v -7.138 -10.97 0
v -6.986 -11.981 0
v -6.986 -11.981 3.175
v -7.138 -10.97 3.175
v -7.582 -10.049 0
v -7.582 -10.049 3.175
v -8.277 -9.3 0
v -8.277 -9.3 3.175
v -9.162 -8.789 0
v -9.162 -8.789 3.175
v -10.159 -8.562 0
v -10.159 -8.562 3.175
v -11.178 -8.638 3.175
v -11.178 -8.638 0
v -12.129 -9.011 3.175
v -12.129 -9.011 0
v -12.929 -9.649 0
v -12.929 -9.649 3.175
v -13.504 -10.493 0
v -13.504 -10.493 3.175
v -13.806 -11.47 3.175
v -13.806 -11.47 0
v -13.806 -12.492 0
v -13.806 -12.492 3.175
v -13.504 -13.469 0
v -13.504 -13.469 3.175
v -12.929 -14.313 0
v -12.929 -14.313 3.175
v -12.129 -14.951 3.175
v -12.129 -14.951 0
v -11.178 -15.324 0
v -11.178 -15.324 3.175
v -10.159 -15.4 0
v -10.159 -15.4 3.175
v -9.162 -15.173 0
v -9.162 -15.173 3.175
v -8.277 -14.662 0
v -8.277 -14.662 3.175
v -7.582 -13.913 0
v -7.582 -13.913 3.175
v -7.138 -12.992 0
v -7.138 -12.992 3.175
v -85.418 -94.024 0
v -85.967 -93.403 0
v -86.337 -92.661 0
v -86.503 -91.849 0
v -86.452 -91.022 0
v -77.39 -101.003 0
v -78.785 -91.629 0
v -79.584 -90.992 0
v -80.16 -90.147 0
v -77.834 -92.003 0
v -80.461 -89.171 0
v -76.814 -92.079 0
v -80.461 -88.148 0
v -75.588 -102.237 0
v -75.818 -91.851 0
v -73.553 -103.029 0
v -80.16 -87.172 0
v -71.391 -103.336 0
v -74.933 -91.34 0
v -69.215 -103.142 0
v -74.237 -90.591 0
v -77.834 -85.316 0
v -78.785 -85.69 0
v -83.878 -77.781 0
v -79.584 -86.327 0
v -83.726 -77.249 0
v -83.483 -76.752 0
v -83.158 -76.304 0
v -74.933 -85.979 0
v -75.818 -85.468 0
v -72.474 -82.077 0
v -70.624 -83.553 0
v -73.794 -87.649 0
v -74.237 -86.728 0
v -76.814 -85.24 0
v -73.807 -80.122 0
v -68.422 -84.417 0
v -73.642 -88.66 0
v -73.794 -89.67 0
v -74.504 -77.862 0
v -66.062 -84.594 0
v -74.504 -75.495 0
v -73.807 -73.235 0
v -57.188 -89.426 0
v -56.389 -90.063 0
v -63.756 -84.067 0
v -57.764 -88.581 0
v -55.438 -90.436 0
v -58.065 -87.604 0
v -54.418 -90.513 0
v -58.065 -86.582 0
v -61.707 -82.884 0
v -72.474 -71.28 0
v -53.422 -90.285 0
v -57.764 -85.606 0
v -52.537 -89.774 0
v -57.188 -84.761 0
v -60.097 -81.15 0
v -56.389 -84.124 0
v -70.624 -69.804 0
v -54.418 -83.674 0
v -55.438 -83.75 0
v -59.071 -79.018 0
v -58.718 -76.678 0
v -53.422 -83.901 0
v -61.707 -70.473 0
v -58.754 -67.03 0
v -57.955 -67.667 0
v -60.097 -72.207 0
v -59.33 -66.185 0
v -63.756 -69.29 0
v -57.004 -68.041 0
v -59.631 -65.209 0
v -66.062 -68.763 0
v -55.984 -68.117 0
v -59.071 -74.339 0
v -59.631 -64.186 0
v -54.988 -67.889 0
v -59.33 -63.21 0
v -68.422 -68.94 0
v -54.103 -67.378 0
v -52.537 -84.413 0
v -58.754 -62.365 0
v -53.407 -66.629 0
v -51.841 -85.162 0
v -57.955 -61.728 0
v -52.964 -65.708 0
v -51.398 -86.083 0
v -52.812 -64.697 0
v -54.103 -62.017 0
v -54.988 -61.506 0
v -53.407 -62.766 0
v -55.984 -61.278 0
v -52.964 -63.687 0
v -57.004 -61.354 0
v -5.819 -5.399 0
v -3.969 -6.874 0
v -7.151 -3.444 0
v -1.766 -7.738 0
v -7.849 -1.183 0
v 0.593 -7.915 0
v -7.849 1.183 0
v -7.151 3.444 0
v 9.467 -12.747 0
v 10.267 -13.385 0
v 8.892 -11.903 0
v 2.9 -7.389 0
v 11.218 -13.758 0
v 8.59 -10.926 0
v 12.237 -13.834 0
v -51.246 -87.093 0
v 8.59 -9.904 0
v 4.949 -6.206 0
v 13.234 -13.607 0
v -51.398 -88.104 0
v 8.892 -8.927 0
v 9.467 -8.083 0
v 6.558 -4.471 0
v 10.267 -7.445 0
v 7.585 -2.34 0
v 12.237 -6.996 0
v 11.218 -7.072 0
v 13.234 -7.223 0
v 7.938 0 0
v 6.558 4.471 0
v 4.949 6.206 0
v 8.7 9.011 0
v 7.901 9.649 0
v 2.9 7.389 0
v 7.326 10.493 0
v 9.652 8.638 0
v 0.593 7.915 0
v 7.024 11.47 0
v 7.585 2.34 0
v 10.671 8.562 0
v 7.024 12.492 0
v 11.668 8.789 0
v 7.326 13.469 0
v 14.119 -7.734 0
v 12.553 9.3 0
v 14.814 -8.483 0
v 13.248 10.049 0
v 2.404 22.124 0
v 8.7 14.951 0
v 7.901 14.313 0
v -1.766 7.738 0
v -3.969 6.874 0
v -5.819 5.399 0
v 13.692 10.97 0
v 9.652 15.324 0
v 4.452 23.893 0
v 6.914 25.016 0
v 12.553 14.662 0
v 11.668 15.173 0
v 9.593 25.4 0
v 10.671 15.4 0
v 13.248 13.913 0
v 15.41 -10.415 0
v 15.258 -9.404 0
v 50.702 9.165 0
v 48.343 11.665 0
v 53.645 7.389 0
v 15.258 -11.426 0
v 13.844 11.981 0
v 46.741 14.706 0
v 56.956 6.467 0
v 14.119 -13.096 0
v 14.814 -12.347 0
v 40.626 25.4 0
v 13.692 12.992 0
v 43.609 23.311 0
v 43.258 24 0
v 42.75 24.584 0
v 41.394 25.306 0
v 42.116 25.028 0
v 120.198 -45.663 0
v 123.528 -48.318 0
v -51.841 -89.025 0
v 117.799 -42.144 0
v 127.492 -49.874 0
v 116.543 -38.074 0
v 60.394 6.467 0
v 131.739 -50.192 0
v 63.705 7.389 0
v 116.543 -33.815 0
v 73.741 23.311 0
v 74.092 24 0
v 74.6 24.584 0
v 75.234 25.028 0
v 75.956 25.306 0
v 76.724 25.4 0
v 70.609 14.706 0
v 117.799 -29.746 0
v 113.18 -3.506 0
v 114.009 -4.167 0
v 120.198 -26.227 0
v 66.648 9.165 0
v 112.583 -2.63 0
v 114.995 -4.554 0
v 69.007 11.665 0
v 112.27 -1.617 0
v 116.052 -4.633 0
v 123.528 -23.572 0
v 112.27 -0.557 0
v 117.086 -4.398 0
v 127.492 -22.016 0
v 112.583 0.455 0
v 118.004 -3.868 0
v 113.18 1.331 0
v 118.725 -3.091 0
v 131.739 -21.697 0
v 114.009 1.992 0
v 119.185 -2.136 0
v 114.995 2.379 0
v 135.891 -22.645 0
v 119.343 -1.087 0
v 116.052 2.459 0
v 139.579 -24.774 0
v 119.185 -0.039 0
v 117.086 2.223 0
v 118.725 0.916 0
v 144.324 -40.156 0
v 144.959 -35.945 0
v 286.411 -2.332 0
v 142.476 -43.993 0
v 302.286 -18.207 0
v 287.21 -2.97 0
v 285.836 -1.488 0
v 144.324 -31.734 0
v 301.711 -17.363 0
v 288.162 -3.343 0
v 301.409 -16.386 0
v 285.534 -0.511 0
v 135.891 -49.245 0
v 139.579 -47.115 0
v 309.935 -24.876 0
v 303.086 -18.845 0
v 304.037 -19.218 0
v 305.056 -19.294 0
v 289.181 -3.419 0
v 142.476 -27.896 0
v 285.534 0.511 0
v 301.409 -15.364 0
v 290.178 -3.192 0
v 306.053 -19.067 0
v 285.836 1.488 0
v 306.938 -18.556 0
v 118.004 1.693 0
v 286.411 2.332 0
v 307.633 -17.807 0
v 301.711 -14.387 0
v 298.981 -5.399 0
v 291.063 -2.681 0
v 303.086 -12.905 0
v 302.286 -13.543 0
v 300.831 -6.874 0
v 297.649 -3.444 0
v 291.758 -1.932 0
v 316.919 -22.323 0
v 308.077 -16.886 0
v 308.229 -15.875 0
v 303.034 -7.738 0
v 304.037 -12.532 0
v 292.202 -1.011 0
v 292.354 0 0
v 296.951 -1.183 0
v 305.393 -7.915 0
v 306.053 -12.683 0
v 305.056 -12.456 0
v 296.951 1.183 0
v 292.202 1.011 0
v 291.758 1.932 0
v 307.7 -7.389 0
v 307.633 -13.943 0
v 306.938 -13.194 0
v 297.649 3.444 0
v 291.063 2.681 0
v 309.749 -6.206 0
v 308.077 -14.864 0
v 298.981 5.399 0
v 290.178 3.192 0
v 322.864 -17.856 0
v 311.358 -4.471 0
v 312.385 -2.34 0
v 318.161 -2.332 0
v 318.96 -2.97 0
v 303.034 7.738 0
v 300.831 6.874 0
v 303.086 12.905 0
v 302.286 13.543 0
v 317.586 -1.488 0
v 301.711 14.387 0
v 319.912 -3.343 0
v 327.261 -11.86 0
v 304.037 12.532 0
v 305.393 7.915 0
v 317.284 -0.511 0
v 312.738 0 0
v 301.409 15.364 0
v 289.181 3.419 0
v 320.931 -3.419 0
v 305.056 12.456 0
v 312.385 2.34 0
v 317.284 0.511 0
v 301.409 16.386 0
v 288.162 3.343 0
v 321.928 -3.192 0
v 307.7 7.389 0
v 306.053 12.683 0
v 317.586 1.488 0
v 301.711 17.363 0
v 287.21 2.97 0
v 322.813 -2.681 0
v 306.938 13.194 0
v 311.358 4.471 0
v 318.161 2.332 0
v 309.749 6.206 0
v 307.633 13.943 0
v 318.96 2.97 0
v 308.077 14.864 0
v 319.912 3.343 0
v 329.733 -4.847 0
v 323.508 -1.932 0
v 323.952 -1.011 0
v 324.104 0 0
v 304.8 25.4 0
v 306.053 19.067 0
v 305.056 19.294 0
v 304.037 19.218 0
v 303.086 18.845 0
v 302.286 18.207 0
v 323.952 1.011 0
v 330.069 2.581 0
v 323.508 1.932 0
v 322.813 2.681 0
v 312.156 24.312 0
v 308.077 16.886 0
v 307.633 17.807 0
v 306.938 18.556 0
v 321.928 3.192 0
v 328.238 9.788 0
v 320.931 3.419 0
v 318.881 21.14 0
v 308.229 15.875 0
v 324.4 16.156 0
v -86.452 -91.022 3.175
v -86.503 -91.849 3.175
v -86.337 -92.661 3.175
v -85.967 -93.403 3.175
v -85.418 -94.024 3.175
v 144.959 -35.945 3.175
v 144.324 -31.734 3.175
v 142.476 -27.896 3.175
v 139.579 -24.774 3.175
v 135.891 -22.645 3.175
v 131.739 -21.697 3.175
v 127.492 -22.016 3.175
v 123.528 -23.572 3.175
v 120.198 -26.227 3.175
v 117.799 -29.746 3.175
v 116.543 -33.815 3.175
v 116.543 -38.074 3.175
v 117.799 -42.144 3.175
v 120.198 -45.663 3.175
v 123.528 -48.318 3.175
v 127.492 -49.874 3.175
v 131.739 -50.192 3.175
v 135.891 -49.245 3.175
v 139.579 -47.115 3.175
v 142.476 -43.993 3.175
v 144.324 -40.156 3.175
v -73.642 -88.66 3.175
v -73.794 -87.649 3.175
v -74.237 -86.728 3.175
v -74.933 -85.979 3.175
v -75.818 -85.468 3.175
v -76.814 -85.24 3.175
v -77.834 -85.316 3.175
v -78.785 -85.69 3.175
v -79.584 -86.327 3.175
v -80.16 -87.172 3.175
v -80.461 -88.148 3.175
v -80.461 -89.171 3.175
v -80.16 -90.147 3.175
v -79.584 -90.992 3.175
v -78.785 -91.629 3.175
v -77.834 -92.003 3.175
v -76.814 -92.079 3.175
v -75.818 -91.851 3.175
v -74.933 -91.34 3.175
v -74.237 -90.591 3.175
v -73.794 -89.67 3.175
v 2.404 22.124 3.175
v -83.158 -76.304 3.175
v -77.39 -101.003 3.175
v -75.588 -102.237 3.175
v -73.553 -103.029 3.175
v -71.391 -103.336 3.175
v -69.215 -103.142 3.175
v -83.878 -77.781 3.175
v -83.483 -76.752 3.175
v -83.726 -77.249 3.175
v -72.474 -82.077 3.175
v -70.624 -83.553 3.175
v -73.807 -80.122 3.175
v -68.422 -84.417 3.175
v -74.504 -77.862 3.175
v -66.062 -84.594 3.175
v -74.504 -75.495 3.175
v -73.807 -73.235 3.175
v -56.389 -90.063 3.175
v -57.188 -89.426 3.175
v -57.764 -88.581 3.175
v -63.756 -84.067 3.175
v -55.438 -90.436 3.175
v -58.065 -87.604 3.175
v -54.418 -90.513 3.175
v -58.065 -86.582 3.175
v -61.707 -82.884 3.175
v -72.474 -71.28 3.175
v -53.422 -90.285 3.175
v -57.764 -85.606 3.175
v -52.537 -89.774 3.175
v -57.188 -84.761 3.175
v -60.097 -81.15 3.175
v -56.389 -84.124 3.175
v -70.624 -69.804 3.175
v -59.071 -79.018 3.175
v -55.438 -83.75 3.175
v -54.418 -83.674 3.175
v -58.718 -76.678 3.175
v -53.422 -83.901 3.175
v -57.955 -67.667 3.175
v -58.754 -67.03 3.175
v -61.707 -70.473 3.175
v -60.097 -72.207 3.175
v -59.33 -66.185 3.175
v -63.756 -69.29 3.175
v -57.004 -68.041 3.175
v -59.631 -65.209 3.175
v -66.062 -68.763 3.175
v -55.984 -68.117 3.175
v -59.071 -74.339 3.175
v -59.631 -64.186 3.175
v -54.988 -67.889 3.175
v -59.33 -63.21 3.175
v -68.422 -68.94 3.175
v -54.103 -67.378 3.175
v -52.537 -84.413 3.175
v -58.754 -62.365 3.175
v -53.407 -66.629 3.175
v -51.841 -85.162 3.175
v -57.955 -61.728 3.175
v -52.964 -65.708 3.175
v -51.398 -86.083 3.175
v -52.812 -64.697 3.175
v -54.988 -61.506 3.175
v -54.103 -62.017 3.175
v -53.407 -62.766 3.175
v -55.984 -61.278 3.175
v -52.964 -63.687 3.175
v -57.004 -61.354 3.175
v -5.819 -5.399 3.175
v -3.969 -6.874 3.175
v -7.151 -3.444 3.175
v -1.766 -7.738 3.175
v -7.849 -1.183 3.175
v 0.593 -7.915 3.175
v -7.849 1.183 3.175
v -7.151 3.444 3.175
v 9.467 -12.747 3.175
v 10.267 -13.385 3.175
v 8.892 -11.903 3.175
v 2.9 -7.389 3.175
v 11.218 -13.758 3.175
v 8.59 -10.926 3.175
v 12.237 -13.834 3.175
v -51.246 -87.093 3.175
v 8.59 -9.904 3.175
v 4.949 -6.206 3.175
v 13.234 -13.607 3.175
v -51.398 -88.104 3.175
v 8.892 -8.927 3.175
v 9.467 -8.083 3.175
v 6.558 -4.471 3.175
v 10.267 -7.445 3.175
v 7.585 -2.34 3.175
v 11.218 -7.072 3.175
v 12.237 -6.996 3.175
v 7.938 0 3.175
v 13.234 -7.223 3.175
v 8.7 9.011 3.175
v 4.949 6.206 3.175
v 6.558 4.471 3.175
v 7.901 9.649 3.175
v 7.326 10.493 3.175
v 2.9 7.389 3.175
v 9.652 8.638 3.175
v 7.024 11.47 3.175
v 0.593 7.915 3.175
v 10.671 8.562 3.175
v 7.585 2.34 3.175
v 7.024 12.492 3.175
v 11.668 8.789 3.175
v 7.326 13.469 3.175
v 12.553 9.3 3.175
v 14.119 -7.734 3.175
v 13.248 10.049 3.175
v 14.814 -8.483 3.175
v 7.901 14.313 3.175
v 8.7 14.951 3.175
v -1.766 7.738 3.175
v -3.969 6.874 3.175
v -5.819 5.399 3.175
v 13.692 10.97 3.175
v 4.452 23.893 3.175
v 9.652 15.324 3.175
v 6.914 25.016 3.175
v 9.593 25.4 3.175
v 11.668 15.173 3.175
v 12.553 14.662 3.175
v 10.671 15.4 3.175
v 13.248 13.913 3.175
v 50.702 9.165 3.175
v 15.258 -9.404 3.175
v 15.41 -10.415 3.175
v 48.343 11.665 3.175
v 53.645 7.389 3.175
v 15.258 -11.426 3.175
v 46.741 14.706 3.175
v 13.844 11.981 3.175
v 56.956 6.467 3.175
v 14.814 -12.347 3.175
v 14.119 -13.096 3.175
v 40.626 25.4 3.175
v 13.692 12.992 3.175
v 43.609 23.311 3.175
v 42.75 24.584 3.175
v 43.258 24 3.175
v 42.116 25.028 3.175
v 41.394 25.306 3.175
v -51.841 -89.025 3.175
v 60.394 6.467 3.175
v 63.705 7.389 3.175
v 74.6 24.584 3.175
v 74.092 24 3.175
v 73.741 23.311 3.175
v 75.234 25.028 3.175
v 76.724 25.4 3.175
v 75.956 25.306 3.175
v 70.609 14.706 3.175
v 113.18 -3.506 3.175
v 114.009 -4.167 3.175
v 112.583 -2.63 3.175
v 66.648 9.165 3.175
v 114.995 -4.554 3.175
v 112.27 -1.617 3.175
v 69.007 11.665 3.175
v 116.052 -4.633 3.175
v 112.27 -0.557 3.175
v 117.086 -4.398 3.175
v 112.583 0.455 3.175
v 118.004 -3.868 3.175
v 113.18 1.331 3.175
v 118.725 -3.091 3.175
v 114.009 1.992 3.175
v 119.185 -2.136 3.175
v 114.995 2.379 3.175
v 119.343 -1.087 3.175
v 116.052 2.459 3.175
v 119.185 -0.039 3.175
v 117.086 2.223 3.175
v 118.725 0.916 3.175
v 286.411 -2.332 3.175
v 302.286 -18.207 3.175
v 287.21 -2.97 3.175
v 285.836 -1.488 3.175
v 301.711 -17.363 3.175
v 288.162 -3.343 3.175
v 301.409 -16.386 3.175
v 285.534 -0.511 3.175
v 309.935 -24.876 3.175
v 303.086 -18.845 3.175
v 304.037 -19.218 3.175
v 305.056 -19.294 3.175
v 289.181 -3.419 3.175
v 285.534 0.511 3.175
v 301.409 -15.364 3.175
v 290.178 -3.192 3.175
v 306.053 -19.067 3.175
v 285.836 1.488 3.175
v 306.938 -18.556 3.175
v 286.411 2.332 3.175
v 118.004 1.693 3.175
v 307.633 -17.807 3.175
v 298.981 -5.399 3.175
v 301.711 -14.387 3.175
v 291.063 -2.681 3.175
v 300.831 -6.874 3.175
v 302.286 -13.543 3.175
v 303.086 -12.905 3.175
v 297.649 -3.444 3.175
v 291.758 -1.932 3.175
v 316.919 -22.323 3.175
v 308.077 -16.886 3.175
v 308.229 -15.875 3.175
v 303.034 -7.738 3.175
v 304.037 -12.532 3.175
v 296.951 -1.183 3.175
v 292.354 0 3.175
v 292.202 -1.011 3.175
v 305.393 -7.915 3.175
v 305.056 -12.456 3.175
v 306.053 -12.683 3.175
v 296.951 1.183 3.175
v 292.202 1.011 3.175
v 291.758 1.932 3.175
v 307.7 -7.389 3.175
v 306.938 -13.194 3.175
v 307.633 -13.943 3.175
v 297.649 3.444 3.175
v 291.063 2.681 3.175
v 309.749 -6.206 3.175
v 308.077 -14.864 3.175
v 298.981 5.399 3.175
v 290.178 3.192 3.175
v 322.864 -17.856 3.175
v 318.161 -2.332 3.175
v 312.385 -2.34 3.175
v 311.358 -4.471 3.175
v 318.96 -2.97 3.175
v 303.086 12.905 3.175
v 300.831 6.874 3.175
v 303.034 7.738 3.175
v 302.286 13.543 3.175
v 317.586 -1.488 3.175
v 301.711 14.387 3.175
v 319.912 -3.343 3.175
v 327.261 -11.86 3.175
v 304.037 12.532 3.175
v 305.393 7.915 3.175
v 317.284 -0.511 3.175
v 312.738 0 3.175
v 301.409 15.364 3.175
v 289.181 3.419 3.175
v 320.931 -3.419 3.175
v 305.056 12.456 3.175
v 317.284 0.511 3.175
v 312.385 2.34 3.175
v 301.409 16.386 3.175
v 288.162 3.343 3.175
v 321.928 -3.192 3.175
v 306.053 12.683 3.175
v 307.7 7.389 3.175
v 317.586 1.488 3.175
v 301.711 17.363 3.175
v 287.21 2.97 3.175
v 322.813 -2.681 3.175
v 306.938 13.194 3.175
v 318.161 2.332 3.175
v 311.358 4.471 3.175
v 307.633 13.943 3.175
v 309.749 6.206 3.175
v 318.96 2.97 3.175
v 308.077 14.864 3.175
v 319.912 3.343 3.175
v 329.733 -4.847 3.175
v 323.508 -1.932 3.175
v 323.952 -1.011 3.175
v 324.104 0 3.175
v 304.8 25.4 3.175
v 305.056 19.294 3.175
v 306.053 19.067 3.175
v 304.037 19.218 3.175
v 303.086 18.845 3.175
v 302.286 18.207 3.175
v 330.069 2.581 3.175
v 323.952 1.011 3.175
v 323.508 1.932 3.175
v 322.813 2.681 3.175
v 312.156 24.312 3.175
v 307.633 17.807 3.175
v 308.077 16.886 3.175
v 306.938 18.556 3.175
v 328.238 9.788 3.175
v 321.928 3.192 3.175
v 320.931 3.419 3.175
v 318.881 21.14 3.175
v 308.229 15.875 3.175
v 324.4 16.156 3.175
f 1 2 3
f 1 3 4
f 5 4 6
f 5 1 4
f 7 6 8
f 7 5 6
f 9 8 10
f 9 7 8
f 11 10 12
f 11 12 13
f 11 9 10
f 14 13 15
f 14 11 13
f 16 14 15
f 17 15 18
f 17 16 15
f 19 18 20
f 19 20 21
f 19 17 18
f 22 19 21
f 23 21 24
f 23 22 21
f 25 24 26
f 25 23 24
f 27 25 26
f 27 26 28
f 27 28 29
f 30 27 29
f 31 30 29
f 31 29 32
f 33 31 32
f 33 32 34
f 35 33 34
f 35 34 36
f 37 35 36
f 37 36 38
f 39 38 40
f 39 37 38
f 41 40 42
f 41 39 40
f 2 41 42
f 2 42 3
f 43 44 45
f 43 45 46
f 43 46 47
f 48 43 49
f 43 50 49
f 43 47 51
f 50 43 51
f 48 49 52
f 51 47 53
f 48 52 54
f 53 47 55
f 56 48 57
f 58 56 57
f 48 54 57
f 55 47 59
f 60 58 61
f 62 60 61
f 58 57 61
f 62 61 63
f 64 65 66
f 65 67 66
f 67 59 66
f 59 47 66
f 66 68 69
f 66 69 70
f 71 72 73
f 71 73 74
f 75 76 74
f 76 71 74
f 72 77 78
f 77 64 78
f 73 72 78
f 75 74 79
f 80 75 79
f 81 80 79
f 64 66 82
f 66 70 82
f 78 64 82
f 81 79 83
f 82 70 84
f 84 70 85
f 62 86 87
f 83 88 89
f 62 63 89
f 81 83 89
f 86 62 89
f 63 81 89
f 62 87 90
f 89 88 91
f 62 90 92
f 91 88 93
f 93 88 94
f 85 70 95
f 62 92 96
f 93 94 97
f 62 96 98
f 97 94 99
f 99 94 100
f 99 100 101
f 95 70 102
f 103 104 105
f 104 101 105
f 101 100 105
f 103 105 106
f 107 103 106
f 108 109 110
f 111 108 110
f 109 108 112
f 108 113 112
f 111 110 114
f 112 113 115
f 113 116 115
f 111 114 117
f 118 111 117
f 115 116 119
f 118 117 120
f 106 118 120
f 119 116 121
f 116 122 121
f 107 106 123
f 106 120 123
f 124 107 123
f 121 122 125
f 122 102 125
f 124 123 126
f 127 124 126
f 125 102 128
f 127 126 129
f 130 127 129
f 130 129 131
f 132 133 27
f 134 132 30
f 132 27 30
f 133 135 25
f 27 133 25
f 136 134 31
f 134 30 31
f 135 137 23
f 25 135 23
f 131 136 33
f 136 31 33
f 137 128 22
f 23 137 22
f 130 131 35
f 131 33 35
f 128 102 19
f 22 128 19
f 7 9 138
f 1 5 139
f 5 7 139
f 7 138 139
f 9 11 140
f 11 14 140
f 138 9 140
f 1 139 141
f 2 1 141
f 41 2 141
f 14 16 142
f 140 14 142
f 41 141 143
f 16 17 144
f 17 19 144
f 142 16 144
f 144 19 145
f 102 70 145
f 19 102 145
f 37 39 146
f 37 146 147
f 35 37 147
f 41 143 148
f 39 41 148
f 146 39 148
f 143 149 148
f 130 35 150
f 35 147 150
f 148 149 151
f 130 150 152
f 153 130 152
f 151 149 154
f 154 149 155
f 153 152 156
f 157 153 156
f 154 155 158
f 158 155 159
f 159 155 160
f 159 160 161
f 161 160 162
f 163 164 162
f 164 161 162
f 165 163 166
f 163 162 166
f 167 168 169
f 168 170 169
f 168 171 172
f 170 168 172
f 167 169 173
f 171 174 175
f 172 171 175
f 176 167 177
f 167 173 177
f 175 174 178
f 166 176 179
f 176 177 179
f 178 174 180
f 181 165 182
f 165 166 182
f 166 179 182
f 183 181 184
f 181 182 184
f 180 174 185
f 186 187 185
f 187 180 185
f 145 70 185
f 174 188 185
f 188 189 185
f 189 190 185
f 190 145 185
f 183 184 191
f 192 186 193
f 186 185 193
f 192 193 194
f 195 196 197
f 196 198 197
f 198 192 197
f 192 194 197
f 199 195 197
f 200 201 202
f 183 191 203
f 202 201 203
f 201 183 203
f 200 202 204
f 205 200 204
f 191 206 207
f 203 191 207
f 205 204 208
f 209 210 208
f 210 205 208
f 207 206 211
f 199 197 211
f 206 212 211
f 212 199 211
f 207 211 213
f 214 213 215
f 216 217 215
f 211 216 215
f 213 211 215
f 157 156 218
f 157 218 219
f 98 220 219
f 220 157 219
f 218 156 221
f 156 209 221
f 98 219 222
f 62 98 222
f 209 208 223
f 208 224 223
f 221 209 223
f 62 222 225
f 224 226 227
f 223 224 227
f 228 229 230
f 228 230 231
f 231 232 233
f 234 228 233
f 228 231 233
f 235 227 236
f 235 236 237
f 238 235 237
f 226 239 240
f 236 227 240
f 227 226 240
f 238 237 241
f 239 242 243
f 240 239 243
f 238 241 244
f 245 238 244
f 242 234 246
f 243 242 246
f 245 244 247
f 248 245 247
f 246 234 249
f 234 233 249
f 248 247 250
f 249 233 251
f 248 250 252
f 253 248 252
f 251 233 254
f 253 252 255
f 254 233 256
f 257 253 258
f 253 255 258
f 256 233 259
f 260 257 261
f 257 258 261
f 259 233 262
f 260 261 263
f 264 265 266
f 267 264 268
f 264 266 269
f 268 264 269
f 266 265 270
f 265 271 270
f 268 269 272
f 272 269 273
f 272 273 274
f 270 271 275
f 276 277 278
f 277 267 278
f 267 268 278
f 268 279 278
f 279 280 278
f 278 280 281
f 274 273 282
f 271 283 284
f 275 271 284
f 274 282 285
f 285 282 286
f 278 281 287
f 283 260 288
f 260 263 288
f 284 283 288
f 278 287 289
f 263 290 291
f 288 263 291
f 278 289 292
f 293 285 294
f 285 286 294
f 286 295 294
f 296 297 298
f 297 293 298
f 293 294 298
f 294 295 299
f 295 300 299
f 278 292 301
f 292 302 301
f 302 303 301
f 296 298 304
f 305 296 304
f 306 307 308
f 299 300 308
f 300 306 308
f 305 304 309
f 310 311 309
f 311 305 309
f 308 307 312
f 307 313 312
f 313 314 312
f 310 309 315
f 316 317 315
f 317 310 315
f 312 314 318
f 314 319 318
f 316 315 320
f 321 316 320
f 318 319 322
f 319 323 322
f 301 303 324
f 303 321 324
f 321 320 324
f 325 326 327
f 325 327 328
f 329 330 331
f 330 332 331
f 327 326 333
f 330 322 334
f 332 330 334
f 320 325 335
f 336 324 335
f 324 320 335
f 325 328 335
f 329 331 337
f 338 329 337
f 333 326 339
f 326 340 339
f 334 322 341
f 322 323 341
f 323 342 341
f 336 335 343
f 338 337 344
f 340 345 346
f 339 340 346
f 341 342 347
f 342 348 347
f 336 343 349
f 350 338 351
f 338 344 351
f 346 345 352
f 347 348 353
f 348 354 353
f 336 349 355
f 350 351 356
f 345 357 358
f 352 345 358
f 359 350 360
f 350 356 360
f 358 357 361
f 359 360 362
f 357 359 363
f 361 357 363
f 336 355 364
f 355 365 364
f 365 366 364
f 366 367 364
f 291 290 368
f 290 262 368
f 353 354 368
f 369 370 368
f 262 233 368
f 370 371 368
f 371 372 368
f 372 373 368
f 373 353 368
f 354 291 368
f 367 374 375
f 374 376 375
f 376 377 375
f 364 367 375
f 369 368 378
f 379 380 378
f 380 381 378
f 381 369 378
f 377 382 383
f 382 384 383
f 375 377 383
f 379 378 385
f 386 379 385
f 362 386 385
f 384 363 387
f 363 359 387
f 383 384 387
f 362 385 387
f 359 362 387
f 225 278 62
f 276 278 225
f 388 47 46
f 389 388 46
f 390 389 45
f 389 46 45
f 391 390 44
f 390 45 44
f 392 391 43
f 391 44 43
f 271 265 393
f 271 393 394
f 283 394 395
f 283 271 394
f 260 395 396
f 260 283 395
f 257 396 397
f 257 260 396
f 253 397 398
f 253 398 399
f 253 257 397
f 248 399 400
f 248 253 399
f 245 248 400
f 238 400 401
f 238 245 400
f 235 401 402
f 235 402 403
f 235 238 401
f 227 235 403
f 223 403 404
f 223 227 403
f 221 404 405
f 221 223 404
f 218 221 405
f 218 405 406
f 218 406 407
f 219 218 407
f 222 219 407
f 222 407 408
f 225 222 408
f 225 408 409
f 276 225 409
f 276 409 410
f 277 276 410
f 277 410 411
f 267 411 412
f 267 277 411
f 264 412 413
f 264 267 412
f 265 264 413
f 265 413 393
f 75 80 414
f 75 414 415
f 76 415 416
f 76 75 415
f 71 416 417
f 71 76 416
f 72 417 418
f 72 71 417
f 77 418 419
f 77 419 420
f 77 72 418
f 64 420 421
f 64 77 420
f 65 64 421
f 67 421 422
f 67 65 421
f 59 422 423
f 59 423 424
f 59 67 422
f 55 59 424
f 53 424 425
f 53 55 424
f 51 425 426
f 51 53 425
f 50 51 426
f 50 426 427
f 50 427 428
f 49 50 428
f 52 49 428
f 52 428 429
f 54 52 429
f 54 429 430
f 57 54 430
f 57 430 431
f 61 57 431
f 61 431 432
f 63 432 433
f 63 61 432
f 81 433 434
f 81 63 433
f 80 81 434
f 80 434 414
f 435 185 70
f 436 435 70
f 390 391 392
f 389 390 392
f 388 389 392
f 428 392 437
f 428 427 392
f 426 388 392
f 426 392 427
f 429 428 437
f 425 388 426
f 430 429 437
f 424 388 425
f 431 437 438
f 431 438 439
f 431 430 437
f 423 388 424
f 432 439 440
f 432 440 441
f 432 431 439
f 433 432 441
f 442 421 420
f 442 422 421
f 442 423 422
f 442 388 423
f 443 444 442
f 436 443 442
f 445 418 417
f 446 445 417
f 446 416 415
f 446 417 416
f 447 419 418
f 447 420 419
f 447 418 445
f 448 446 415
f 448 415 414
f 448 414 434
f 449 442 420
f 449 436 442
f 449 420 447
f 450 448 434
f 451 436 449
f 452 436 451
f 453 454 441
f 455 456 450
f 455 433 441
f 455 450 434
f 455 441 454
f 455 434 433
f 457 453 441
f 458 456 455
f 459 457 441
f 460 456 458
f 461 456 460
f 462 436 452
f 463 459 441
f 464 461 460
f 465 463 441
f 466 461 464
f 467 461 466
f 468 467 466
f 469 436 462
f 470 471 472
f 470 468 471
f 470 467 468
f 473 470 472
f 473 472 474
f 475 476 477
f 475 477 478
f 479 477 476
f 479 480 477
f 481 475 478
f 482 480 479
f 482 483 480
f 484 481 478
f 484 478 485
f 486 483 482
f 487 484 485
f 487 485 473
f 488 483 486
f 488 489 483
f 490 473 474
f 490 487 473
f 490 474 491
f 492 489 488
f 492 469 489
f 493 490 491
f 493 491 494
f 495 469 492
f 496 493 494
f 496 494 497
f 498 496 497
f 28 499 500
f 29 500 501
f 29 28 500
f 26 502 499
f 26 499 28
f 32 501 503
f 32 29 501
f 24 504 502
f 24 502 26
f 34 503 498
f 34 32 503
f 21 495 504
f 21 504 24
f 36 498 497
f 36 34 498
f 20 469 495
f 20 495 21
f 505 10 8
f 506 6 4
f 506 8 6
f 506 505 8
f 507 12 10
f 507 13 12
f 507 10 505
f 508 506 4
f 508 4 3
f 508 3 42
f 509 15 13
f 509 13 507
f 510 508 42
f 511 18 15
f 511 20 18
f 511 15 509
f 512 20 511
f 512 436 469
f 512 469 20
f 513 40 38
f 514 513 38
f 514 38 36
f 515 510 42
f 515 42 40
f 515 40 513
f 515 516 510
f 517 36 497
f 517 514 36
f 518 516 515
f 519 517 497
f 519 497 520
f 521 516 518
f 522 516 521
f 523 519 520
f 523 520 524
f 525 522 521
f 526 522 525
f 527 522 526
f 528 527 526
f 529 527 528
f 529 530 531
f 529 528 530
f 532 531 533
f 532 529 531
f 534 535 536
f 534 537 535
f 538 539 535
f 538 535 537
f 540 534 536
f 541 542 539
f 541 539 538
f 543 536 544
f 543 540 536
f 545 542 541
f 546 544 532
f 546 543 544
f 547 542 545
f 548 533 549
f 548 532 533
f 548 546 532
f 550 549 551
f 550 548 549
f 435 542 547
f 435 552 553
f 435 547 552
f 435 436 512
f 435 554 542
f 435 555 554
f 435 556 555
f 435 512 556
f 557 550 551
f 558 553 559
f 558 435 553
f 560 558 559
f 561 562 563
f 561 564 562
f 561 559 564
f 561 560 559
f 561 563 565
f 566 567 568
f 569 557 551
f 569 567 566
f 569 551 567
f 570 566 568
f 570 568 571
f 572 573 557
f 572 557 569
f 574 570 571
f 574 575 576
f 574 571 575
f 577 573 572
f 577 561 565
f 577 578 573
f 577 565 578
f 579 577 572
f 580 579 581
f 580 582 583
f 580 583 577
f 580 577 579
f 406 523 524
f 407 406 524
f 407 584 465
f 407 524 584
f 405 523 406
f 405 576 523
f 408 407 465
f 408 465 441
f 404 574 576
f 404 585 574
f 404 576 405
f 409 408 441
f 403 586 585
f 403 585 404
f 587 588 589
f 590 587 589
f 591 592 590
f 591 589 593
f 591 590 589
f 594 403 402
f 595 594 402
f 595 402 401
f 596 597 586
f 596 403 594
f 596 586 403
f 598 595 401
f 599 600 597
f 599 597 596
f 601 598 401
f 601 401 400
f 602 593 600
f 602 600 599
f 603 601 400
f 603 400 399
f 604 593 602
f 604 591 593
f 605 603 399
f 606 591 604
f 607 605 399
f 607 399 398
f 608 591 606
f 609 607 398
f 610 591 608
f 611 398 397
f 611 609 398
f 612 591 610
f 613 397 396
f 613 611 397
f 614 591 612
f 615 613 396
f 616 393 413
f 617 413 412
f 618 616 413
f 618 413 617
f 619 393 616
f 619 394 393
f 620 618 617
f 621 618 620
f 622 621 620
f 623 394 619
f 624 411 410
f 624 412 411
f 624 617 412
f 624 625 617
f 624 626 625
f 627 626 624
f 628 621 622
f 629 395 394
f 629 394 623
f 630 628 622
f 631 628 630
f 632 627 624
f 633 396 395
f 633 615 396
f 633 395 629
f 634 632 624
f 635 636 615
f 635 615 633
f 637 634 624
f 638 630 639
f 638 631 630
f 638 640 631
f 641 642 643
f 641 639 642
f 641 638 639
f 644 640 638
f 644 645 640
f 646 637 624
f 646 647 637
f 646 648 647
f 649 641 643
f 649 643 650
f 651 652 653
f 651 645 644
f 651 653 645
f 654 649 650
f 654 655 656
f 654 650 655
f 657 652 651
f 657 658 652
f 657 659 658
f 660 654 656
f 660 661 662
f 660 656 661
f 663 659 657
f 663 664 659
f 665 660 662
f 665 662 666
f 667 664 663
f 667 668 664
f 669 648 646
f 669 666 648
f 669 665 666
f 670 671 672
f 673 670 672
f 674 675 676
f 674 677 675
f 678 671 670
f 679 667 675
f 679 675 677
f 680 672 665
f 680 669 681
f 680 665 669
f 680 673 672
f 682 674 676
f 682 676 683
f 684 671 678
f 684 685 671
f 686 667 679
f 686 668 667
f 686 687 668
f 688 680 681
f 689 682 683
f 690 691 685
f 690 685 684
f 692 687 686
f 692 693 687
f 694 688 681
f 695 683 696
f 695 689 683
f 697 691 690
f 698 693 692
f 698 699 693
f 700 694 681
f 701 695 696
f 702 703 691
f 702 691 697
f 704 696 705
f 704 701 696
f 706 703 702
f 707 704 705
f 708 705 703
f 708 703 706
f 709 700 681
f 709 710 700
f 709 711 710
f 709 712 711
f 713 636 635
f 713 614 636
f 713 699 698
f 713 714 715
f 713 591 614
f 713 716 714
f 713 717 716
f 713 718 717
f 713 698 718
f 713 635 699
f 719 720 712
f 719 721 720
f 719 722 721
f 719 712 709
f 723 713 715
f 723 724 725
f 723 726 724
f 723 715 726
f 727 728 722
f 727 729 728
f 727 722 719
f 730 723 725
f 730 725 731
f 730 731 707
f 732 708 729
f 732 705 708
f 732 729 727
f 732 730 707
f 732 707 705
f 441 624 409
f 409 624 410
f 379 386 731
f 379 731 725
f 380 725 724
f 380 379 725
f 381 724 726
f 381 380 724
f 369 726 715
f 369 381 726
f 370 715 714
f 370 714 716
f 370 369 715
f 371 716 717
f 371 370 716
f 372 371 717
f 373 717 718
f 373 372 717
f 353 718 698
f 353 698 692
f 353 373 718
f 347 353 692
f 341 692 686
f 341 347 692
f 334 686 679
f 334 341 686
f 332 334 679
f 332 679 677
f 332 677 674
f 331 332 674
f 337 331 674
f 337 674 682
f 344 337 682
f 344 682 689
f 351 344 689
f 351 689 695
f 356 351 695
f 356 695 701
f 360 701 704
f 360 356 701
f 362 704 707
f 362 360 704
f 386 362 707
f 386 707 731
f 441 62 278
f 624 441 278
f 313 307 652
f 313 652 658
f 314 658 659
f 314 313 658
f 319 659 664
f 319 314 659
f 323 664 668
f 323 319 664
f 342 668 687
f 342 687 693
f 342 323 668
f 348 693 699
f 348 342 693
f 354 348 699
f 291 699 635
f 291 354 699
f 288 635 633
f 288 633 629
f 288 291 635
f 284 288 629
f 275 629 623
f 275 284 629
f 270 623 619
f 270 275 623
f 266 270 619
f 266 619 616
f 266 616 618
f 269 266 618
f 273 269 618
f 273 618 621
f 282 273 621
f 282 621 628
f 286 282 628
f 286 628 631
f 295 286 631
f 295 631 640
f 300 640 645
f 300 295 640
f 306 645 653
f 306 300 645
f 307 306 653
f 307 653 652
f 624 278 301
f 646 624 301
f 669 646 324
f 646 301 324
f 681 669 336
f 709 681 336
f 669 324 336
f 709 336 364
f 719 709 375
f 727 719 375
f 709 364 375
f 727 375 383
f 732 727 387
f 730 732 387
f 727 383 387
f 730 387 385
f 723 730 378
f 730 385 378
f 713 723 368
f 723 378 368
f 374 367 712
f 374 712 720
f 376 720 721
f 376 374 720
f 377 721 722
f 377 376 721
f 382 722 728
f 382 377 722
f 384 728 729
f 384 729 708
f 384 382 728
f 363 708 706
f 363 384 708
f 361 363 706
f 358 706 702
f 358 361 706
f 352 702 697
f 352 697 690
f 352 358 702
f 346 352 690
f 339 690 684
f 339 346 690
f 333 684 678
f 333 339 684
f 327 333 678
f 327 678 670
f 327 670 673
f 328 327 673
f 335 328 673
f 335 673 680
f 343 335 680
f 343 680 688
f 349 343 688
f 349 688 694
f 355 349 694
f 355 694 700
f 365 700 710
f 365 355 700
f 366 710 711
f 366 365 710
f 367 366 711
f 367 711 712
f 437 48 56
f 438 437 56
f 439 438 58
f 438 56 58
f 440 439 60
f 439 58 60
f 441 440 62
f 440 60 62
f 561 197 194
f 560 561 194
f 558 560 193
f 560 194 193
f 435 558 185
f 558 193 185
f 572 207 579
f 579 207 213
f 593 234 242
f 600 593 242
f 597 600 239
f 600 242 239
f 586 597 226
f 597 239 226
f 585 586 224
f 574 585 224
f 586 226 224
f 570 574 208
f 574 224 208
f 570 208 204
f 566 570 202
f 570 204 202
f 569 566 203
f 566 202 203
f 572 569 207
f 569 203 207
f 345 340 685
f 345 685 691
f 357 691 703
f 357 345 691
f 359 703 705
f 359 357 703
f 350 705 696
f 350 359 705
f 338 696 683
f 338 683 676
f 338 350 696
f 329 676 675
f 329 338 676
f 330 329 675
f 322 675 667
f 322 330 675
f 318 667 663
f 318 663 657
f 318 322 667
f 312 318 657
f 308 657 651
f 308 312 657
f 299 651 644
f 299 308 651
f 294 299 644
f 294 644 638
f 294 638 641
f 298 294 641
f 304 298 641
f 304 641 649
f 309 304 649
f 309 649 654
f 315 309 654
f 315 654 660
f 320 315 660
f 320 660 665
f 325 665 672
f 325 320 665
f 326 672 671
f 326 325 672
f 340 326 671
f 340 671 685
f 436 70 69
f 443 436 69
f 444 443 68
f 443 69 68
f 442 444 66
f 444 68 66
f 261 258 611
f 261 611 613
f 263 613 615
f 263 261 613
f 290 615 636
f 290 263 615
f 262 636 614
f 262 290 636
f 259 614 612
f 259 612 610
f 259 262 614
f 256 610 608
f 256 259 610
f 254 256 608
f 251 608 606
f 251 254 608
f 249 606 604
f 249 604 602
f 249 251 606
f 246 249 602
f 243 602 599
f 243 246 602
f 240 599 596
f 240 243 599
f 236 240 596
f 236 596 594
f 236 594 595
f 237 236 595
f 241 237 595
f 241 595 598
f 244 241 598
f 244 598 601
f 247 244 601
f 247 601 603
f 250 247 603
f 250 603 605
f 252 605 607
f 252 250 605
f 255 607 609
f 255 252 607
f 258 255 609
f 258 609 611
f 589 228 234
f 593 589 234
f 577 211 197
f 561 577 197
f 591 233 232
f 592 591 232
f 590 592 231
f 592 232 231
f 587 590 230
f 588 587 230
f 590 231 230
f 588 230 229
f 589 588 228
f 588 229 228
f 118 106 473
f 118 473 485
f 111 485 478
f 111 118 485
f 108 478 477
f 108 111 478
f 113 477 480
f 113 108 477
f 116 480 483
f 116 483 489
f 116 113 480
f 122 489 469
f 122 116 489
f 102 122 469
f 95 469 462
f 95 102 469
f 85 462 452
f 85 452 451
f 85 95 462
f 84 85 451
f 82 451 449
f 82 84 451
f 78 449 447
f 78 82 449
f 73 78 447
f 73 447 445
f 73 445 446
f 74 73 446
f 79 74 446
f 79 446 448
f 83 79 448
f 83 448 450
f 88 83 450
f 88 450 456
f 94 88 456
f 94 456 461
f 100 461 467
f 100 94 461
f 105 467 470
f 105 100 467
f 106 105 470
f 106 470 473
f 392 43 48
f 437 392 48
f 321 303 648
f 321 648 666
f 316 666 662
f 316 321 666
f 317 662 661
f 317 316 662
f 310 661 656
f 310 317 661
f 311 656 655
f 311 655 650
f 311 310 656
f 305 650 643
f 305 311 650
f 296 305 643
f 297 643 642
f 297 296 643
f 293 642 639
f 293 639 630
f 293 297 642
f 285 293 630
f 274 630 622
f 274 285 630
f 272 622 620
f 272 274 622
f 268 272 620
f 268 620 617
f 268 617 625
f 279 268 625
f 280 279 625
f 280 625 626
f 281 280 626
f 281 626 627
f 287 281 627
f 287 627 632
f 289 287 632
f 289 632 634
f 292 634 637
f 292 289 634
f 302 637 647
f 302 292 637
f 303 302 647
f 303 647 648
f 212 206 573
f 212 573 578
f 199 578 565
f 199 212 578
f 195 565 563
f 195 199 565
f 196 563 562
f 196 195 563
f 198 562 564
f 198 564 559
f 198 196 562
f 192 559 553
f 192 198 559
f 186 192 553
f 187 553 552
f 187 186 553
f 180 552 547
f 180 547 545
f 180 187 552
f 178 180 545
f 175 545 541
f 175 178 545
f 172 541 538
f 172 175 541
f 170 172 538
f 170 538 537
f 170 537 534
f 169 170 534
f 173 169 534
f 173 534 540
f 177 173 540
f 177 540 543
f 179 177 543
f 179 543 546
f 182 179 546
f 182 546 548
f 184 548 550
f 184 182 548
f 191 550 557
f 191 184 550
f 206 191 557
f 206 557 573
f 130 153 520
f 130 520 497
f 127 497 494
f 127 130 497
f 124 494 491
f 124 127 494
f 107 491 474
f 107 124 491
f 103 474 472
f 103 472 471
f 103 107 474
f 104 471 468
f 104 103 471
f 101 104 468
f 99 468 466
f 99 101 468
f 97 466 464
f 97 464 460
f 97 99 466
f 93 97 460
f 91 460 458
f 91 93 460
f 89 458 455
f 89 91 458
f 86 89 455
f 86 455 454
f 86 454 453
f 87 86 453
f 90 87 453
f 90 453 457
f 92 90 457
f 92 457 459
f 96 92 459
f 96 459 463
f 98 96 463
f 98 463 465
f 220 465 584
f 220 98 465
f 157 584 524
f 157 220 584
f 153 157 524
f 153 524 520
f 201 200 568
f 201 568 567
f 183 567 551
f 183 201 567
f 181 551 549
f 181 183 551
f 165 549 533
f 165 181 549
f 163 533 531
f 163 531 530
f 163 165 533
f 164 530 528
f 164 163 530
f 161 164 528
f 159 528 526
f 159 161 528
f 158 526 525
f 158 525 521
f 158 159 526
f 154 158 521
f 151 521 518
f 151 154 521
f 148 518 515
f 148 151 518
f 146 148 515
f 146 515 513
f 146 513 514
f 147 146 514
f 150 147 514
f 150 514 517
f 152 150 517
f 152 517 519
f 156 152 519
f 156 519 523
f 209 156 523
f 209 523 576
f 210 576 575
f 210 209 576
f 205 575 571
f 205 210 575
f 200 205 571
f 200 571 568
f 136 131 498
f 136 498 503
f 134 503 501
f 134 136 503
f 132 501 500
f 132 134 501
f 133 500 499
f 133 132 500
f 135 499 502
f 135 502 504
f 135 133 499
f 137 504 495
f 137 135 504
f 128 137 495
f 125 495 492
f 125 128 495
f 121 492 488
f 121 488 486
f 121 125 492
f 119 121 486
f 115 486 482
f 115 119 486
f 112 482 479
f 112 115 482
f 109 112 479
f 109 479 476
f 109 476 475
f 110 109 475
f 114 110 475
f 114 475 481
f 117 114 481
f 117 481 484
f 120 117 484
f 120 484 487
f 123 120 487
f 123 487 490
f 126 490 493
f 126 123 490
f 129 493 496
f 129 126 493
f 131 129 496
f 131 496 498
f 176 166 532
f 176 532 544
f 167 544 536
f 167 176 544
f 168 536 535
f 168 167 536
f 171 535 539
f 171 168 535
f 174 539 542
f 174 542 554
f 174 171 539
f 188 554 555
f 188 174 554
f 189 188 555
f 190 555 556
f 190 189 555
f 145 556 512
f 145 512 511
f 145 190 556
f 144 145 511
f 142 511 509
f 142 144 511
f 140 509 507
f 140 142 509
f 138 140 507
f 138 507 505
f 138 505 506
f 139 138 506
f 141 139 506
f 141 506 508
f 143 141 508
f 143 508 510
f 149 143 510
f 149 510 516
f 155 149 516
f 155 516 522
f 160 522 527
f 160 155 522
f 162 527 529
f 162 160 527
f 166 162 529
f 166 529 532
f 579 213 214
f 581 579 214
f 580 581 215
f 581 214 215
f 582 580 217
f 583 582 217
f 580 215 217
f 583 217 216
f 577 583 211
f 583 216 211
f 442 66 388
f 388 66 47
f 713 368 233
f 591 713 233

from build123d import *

# Parameters (mm, degrees)
SKETCH1_R           = 7.9375
SKETCH1_R_2         = 3.429
SKETCH1_R_3         = 14.2875
SKETCH1_R_4         = 3.556
BOSS_EXTRUDE1_DEPTH = 3.175


with BuildPart() as part:
    # Sketch1 → Boss-Extrude1 (new body)
    with BuildSketch(Plane.XY):
        with BuildLine():
            Line((304.8, 25.4), (76.724364717, 25.4))
            ThreePointArc((76.724364717, 25.4), (74.903259532, 24.825807741), (73.740840646, 23.310913955))
            Line((73.740840646, 23.310913955), (70.609033369, 14.70634418))
            ThreePointArc((70.609033369, 14.70634418), (58.674937085, 6.35), (46.740840801, 14.70634418))
            Line((46.740840801, 14.70634418), (43.609033524, 23.310913955))
            ThreePointArc((43.609033524, 23.310913955), (42.446614639, 24.825807741), (40.625509453, 25.4))
            Line((40.625509453, 25.4), (9.593010709, 25.4))
            ThreePointArc((9.593010709, 25.4), (5.643057573, 24.542381105), (2.404401957, 22.123962251))
            Line((2.404401957, 22.123962251), (-83.157756356, -76.304041526))
            ThreePointArc((-83.157756356, -76.304041526), (-83.615224536, -76.995200552), (-83.878219746, -77.781210383))
            Line((-83.878219746, -77.781210383), (-86.451909051, -91.021694031))
            ThreePointArc((-86.451909051, -91.021694031), (-86.337264221, -92.661191482), (-85.418230161, -94.023715509))
            Line((-85.418230161, -94.023715509), (-77.389837916, -101.002690413))
            ThreePointArc((-77.389837916, -101.002690413), (-73.552808487, -103.028646494), (-69.21525712, -103.142405102))
            Line((-69.21525712, -103.142405102), (309.934982787, -24.875529176))
            ThreePointArc((309.934982787, -24.875529176), (330.068542113, 2.580848594), (304.8, 25.4))
        make_face()
        with Locations((304.8, 0)):
            Circle(SKETCH1_R, mode=Mode.SUBTRACT)
        Circle(SKETCH1_R, mode=Mode.SUBTRACT)
        with Locations((-66.655597345, -76.678493351)):
            Circle(SKETCH1_R, mode=Mode.SUBTRACT)
        with Locations((304.8, 15.875)):
            Circle(SKETCH1_R_2, mode=Mode.SUBTRACT)
        with Locations((320.675, 0)):
            Circle(SKETCH1_R_2, mode=Mode.SUBTRACT)
        with Locations((304.8, -15.875)):
            Circle(SKETCH1_R_2, mode=Mode.SUBTRACT)
        with Locations((288.925, 0)):
            Circle(SKETCH1_R_2, mode=Mode.SUBTRACT)
        with Locations((-56.24066026, -64.697478765)):
            Circle(SKETCH1_R_2, mode=Mode.SUBTRACT)
        with Locations((-54.674582759, -87.093430436)):
            Circle(SKETCH1_R_2, mode=Mode.SUBTRACT)
        with Locations((-77.070534431, -88.659507937)):
            Circle(SKETCH1_R_2, mode=Mode.SUBTRACT)
        with Locations((-10.414937085, -11.981014586)):
            Circle(SKETCH1_R_2, mode=Mode.SUBTRACT)
        with Locations((11.981014586, -10.414937085)):
            Circle(SKETCH1_R_2, mode=Mode.SUBTRACT)
        with Locations((10.414937085, 11.981014586)):
            Circle(SKETCH1_R_2, mode=Mode.SUBTRACT)
        with Locations((130.671295769, -35.944879509)):
            Circle(SKETCH1_R_3, mode=Mode.SUBTRACT)
        with Locations((115.786625943, -1.087398892)):
            Circle(SKETCH1_R_4, mode=Mode.SUBTRACT)
    extrude(amount=BOSS_EXTRUDE1_DEPTH)


solid = part.part
